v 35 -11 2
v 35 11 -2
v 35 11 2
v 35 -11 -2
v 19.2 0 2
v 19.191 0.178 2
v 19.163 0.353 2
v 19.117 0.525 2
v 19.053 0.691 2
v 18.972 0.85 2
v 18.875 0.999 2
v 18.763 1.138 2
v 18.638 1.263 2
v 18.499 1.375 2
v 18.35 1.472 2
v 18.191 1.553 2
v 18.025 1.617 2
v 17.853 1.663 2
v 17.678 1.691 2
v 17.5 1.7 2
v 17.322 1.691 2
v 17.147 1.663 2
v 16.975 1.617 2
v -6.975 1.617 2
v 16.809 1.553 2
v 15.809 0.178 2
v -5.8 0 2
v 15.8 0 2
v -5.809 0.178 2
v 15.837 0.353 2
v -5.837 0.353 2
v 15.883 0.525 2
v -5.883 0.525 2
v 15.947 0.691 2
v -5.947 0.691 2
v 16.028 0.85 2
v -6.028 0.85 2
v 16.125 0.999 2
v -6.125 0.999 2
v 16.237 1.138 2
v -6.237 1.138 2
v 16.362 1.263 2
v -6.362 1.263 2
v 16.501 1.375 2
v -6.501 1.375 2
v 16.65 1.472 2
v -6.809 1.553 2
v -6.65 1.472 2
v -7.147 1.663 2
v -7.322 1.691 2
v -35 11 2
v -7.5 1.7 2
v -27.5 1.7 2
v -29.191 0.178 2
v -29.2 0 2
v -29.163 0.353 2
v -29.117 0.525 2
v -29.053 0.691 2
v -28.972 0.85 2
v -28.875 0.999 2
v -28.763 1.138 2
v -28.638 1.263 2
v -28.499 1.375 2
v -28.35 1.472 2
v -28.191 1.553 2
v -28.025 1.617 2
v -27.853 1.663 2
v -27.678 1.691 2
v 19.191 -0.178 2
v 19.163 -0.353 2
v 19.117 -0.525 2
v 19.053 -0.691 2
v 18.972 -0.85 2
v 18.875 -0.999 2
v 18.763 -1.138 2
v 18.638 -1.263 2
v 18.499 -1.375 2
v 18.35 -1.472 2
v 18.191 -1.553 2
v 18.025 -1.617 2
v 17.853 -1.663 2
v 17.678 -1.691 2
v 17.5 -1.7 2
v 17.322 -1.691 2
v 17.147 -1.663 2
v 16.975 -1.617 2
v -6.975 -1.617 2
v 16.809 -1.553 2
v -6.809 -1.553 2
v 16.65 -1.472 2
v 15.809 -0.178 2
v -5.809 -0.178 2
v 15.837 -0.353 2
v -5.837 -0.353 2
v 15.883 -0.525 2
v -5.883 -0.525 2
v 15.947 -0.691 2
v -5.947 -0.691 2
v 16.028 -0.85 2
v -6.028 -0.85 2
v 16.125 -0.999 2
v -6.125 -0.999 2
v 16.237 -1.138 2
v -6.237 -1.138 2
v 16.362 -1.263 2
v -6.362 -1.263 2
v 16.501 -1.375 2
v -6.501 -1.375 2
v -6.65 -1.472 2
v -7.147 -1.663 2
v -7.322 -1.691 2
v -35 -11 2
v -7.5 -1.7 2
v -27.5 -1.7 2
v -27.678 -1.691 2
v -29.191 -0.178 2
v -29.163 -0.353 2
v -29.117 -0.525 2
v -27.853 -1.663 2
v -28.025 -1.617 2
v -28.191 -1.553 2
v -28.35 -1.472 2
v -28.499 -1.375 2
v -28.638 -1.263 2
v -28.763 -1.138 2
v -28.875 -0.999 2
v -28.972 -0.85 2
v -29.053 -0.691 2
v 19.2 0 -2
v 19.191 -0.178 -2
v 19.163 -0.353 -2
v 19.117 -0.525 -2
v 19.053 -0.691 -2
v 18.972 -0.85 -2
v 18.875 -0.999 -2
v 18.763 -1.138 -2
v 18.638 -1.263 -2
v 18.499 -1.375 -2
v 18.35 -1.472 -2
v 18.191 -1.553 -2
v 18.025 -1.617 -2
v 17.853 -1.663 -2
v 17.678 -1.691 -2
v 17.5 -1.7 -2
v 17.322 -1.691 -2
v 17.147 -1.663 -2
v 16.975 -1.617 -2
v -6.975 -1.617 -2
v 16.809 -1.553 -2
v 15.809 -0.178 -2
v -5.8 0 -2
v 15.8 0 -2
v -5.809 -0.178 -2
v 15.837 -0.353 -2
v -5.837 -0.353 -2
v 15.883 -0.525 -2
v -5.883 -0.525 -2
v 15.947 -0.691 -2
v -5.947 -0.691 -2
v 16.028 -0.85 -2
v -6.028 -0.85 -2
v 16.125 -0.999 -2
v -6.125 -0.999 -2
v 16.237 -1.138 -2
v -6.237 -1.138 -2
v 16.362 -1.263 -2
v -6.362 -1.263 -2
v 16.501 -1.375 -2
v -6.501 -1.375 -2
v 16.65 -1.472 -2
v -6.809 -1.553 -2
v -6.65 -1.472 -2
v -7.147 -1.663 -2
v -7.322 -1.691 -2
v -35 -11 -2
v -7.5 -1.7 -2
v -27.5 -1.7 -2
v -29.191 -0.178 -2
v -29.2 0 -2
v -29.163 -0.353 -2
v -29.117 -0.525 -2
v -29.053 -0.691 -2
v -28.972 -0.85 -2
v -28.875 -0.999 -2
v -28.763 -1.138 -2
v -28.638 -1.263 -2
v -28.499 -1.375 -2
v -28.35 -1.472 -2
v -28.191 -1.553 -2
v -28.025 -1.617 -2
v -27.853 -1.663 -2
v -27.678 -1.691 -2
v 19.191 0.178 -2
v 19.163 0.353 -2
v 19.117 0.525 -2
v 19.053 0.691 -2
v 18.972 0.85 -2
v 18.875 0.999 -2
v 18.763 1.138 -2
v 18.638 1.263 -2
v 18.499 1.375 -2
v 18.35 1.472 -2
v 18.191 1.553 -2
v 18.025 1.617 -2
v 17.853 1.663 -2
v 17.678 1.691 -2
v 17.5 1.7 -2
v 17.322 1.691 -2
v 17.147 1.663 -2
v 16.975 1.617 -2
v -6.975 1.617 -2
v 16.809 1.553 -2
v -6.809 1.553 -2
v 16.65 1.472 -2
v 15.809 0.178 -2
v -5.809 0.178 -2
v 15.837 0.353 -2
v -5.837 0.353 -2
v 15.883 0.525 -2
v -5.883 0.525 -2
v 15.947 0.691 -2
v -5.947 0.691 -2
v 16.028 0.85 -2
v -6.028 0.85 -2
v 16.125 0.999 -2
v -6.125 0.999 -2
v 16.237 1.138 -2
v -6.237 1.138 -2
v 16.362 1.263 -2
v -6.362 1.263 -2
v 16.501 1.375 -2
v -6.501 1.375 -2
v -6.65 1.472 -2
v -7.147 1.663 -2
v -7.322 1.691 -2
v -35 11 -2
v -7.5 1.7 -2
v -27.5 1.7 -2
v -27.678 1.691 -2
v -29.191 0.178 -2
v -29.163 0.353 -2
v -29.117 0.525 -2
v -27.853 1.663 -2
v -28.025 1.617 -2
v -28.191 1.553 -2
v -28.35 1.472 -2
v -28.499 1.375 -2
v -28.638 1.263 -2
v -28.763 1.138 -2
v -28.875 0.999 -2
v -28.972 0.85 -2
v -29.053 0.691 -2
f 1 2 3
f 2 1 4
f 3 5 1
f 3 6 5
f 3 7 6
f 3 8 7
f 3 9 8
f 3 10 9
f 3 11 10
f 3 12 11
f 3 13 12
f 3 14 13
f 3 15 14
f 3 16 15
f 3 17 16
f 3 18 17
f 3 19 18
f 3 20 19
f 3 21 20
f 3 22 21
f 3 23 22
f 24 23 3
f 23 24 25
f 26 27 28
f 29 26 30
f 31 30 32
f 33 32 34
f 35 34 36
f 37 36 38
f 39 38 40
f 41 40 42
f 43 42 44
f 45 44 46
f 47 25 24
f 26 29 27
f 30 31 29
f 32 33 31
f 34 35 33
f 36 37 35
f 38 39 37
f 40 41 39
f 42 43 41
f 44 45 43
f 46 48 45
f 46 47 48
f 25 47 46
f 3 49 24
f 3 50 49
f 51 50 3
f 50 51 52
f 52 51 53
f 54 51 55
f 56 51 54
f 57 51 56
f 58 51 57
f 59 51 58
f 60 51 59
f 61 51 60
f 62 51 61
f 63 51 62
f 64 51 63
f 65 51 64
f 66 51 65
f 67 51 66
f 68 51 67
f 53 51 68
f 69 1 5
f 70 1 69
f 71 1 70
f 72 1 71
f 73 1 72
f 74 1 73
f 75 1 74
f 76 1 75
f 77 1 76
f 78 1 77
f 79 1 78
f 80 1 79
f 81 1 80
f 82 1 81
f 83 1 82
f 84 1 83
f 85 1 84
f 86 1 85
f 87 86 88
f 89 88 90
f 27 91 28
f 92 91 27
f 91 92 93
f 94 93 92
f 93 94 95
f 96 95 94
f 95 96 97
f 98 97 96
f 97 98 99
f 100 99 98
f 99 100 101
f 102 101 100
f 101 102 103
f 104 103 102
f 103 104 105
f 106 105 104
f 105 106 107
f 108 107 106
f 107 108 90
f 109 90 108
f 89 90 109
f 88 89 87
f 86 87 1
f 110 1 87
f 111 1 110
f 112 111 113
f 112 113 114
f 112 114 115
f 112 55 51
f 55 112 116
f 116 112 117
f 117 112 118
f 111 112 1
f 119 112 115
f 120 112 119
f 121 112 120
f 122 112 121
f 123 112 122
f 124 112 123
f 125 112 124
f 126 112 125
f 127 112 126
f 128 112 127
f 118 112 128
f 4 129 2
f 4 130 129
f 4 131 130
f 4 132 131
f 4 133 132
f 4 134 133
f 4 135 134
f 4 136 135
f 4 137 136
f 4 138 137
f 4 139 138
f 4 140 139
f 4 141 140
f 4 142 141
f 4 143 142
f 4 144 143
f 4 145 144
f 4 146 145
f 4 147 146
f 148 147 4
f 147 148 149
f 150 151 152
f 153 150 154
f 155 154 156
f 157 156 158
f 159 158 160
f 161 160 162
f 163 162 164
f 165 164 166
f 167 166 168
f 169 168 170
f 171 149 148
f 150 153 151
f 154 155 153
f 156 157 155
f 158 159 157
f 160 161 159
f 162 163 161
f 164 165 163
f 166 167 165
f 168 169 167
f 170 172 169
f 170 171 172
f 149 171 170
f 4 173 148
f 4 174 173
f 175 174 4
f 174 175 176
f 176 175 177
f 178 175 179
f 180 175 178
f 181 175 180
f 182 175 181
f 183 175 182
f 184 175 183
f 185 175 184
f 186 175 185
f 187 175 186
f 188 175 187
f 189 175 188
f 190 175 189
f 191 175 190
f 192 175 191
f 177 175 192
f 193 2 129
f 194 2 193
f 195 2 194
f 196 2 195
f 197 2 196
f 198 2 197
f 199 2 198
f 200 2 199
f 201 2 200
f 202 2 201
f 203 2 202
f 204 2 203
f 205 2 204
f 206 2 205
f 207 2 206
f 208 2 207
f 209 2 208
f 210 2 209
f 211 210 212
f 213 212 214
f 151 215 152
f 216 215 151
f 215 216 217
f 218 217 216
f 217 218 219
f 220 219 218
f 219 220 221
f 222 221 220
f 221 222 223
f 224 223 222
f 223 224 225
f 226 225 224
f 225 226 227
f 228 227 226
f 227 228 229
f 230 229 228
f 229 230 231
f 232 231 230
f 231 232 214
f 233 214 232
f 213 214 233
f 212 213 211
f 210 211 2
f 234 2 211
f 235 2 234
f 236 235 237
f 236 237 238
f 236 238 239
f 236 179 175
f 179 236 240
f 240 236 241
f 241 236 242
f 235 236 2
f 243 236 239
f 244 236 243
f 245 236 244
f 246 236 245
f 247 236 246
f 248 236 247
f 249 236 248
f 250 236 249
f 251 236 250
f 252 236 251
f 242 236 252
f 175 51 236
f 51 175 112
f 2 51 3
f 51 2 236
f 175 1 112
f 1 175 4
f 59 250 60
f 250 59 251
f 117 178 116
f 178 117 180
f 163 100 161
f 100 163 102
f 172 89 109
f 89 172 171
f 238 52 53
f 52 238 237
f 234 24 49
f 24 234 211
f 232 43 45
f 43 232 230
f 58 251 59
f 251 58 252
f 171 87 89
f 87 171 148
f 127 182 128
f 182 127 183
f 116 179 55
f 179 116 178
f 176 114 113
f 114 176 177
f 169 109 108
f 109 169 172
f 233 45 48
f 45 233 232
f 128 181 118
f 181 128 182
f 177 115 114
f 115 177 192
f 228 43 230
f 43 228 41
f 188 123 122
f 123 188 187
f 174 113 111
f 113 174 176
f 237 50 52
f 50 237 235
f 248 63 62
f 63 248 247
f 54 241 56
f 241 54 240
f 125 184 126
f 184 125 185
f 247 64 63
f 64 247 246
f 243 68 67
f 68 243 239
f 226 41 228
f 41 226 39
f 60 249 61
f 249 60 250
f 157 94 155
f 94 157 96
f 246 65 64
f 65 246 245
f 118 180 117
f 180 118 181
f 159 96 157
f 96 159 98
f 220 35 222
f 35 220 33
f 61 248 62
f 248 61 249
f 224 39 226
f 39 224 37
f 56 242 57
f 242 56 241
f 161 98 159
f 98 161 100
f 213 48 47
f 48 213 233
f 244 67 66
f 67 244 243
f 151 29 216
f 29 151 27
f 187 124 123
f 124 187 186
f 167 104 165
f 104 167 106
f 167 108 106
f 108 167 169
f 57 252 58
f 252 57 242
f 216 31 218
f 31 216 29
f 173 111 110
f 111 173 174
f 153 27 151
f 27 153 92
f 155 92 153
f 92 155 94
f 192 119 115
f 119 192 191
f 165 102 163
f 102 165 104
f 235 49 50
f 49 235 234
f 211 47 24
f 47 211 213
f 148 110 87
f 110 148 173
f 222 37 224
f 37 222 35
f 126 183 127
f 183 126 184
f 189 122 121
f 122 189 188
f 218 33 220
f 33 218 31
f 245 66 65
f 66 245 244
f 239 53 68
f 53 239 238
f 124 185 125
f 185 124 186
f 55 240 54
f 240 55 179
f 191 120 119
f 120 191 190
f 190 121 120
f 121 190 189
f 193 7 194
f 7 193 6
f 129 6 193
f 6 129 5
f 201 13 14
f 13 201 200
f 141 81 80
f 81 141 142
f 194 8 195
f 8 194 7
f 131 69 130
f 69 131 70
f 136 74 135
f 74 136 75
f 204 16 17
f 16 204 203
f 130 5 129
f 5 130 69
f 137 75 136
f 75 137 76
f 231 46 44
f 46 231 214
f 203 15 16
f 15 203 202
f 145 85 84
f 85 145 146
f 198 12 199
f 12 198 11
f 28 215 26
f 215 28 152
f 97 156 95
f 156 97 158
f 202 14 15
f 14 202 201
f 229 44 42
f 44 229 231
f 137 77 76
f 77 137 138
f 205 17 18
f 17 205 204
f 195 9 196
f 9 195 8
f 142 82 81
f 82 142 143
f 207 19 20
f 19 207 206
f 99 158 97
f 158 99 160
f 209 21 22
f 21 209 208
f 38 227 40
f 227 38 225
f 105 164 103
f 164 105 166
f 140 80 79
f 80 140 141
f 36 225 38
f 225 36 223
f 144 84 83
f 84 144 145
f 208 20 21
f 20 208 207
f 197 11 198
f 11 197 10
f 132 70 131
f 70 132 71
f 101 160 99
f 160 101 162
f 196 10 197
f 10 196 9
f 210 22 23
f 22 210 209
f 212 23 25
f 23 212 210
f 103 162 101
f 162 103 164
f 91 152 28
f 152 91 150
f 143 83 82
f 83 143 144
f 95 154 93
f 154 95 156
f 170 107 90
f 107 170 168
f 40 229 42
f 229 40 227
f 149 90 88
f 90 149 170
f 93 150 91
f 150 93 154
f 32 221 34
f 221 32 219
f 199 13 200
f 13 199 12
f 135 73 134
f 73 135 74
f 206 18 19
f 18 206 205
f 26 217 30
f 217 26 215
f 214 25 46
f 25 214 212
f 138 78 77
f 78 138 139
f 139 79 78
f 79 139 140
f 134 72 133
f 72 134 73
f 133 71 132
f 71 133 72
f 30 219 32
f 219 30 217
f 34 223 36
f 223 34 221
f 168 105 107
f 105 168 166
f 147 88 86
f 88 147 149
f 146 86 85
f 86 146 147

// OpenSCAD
// Adjustable sensor mounting tab.
$fn = 60;
eps = 0.02;
length = 70;
width = 22;
thickness = 4;
slot_l = 20;
module slot(x) { hull() { translate([x-slot_l/2,0,-thickness/2-eps]) cylinder(d=3.4,h=thickness+2*eps); translate([x+slot_l/2,0,-thickness/2-eps]) cylinder(d=3.4,h=thickness+2*eps); } }
difference() { cube([length,width,thickness],center=true); slot(-length/4); translate([length/4,0,-thickness/2-eps]) cylinder(d=3.4,h=thickness+2*eps); }
